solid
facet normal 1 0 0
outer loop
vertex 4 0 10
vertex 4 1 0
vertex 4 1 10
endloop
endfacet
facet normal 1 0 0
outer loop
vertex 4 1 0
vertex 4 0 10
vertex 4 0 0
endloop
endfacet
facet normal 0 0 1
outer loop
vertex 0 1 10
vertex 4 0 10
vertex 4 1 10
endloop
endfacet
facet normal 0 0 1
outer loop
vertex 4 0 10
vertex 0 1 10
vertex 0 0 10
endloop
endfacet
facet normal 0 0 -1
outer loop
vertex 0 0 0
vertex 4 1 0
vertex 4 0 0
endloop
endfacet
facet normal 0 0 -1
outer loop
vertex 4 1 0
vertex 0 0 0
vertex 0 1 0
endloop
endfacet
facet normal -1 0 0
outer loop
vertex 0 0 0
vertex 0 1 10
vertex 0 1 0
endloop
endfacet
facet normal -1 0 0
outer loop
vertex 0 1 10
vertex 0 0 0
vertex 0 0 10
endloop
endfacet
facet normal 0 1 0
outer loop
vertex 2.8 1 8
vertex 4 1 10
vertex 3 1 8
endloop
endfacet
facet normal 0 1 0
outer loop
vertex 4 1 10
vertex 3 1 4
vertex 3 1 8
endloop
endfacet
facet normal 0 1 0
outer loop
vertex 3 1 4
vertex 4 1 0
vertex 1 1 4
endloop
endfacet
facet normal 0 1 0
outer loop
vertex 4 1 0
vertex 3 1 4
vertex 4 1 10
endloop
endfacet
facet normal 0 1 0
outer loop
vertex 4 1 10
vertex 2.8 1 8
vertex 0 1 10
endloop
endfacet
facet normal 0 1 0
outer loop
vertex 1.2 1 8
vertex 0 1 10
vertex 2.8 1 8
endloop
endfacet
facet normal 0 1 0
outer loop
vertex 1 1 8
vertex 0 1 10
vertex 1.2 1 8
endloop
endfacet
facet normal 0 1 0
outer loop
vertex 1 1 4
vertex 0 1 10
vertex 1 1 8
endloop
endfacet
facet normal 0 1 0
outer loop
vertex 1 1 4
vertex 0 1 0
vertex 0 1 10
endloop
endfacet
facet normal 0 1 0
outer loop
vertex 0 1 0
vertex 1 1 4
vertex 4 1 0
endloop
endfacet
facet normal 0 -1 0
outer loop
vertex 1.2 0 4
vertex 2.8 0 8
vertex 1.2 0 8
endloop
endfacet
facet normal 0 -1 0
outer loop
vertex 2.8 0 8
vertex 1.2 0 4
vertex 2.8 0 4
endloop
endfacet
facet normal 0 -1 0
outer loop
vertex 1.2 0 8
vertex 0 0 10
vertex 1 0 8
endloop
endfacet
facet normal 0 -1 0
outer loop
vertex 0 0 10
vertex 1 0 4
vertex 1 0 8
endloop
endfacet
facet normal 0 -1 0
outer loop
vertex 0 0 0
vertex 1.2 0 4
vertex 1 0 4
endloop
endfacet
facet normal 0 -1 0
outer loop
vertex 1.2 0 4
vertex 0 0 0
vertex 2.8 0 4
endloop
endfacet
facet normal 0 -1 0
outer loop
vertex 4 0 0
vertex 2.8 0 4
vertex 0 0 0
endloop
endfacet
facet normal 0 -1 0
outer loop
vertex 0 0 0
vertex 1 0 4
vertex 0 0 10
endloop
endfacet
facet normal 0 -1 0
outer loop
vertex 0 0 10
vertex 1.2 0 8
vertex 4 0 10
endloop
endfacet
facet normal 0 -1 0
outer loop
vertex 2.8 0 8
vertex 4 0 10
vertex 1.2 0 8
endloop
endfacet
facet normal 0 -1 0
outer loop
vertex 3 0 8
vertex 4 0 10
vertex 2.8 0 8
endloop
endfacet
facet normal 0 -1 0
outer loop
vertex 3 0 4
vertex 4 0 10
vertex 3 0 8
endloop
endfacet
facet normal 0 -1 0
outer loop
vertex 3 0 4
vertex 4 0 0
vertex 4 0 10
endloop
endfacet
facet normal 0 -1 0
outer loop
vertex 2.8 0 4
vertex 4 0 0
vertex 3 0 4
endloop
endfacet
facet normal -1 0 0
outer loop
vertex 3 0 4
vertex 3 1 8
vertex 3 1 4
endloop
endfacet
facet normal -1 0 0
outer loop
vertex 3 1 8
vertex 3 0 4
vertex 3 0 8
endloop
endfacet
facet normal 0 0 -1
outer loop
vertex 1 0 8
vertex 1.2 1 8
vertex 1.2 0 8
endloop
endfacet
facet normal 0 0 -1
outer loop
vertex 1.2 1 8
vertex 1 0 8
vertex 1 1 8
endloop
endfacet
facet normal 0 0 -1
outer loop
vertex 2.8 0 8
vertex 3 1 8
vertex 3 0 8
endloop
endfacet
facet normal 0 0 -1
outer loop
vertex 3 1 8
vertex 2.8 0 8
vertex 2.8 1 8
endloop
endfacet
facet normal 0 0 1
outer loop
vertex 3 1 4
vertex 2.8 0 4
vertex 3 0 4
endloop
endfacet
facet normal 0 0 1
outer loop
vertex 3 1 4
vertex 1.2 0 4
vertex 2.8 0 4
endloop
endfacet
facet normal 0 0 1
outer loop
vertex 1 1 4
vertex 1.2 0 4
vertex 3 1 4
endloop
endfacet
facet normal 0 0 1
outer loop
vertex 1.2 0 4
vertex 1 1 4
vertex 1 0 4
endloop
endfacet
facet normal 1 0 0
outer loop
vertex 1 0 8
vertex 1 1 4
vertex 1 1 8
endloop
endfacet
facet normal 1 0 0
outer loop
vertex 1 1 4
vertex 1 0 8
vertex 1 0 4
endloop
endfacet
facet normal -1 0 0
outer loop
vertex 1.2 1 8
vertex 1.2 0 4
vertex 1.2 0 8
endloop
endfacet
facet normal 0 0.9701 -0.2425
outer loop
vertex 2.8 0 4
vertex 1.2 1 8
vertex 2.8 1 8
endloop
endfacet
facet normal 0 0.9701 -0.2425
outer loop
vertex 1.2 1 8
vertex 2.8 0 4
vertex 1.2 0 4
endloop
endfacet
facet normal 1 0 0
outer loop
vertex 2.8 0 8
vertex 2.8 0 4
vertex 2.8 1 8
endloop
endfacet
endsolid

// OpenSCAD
// file: ../math/vect.scad
function vect_scalar_sum(v, incr) = [for (i = [0: len(v) - 1]) v[i] + incr];

function vSize(size) = (!is_list(size)) ? [size, size, size]: size; 


function vect_2d_to_3d(vect, z = 0) = [vect[0], vect[1], z];

function vect_rotate2d(vect, b) = [
    cos(b) * vect[0] - sin(b) * vect[1],
    sin(b) * vect[0] + cos(b) * vect[1]
];

function round_vect(v) = [for (i = [0: len(v) - 1]) round(v[i])];

function vect_swap_xy(v1) = [v1.y, v1.x, v1.z];

function vectorize_2(x) = is_list(x) ? [x.x, x.y] : [x, x];

function vectorize_3(x) = is_list(x) ? [x.x, x.y, x.z] : [x, x, x];

echo (vectorize_3(1));
// file: ../primitives/pyramid.scad
use <../math/align.scad>
use <../math/vect.scad>

module pyramid4(sizes, center){
    align_uncenter(sizes, !center){
        size = [sizes[0] / 2 , sizes[1] / 2, sizes[2]];
        polyhedron(
        points=[ 
            [size[0],size[1],0],
            [size[0],-size[1],0],
            [-size[0],-size[1],0],
            [-size[0],size[1],0], // the four points at base
            [0,0,size[2]]  
        ],                                
        faces=[ 
            [0,1,4],
            [1,2,4],
            [2,3,4],
            [3,0,4],              // each triangle side
            [1,0,3],
            [2,1,3] 
        ]                         // two triangles for square base
        );
    }
}

//
// 
// truncated_pyramid4([20, 20, 30], [5, 5], center = false);
//
module truncated_pyramid4(sizes, top_sizes, center = true){
    align_uncenter(sizes, !center){
        size = [sizes[0] / 2 , sizes[1] / 2, sizes[2]];
        top_size = [top_sizes[0] / 2 , top_sizes[1] / 2];
        h = size[2];
        polyhedron(
        points=[ 
            [size[0], size[1], 0],
            [size[0], -size[1], 0],
            [-size[0], -size[1], 0],
            [-size[0], size[1], 0], // the four points at base

            [top_size[0], top_size[1], h],
            [top_size[0], -top_size[1], h],
            [-top_size[0], -top_size[1], h],
            [-top_size[0], top_size[1], h],
        ],                                 // the apex point 
        faces=[ 
            [3, 2, 1, 0],
            [0, 1, 5, 4],
            [1, 2, 6, 5],
            [2, 3, 7, 6],
            [3, 0, 4, 7],
            [4, 5, 6, 7]
        ]);
    }
}

// truncated_pyramid4([20, 20, 30], [15, 5], center = true);


module pyramid(angles, r, r1, h, center = true){
    function _2d_dot(vect, angle) = vect_rotate2d(vect, angle);
    function _dot(vect, angle, z) = vect_2d_to_3d(_2d_dot(vect, angle), z);
    function _adapt_index(i, num) = 
        i < 0 ? _adapt_index(num + i, num) :
        i < num ? i : _adapt_index(i - num, num);
    function _du(i, num) = _adapt_index(i, num) + num;
    function _db(i, num) = _adapt_index(i, num);

    vect = [r, 0];
    vectU = [r1, 0];
    angle = 360 / angles;
    points = concat(
        [for (i = [0: angles - 1]) _dot(vect, i * angle, 0)],
        [for (i = [0: angles - 1]) _dot(vectU, i * angle, h)]
    );

    faces = concat(
        [[for (i = [0: angles - 1]) _db(i, angles)]],
        [[for (i = [0: angles - 1]) _du(angles - i, angles)]],
        [for (i = [0: angles]) [
            _db(i, angles),
            _du(i, angles), 
            _du(i + 1, angles), 
            _db(i + 1, angles) 
            ]
        ]
    );
    polyhedron(points=points, faces=faces);
}

pyramid(4, 20, 10, 50);
// file: ../math/align.scad
use <vect.scad>
module align_center(sizes, center = true, centerZ = false, vector=[1, 1, 0]){
    xxx=vector.x;
    yyy=vector.y;
    zzz=centerZ || vector.z;
    sizes = vSize(sizes);
    if (center){
        translate([xxx ? -sizes[0] / 2 : 0, yyy ? -sizes[1] / 2: 0, zzz ? -sizes[2]/2 : 0]){
            children();
        }
    } else {
        children();
    }   
}

module align_uncenter(sizes, uncenter = true, uncenterZ = false){
    sizes = vSize(sizes);
    if (uncenter){
        translate([sizes[0] / 2, sizes[1] / 2, (uncenterZ ? sizes[2]/2 : 0)]){
            children();
        }
    } else {
        children();
    }   
}

ALIGN_LEFT=[1, 0, 0];
ALIGN_RIGHT=[-1, 0, 0];
ALIGN_BOTTOM=[0, 0, -1];
ALIGN_TOP=[0, 0, 1];
ALIGN_BACK=[0, -1, 0];
ALIGN_FWD=[0, 1, 0];

function _aligner(target, source, align) = 
            align > 0 ? target * align:
            align < 0 ? source * align:
            (target - source) / 2;    

function aligner(target_sizes, source_sizes, vector) = [
    vector.x == undef ? 0 : _aligner(target_sizes.x, source_sizes.x, vector.x),
    vector.y == undef ? 0 : _aligner(target_sizes.y, source_sizes.y, vector.y),
    vector.z == undef ? 0 : _aligner(target_sizes.z, source_sizes.z, vector.z)
];

module align_relative(
    target_sizes, 
    source_sizes, 
    vector=[0,0,undef]
    ){
        
    // x = vector.x == undef ? 0 : _aligner(target_sizes.y, source_sizes.x, vector.x);
    // y = vector.y == undef ? 0 : _aligner(target_sizes.y, source_sizes.y, vector.y);
    // z = vector.z == undef ? 0 : _aligner(target_sizes.z, source_sizes.z, vector.z);
    to_translate = aligner(target_sizes, source_sizes, vector);
    echo(to_translate);
    translate(to_translate)
        children();
}

module align_center_source_vs_target(target_sizes, source_sizes, centerZ = false){
    align_relative(target_sizes=target_sizes, source_sizes=source_sizes, vector=[0, 0, centerZ ? 1 : 0])
        children();
}


module zz(z){
    translate([0, 0, z])
        children();
}

module xx(x){
    translate([x, 0, 0])
        children();
}

module yy(y){
    translate([0, y, 0])
        children();
}

module rz(z){
    rotate([0, 0, z])
        children();
}

module rx(x){
    rotate([x, 0, 0])
        children();
}

module ry(y){
    rotate([0, y, 0])
        children();
}

module zc(){
    translate([0, 0, -0.01])
        children();
}
module xc(){
    translate([-0.01, 0, 0])    
        children();
}
module yc(){
    translate([0, -0.01, 0])
        children();
}

// align_center_source_vs_target([100, 100, 1], [10, 10, 10], centerZ = false){
//     cube([100,100,1]);
//     cube([10,10,10]);
// }

// align_center(20){
//     align_uncenter(20){
//         cube(20);
//     }
// }

// target_sizes = [20, 20, 20];
// source_sizes = [10, 10, 10];
// color("azure",0.25)
//     cube(size=target_sizes);
// align_relative(target_sizes=target_sizes, source_sizes=source_sizes, vector=[0, 0, undef]){
//     color("red",0.25)
//         zz(20)
//         cube(size=source_sizes);
// }
// main file
use <../math/align.scad>
use <../primitives/pyramid.scad>

module simple_latch_mask(sizes) {
  cube(sizes);
}

module simple_latch_mother(sizes, hole_sizes, hole_offset = 2){
    difference(){
        cube(sizes);
        yc() xx(sizes.x / 2 - hole_sizes.x / 2) zz(sizes.z - hole_sizes.y - hole_offset) cube([hole_sizes.x, sizes.y + 1, hole_sizes.y]);
    }
}

module simple_latch_father(sizes, hole_sizes, hole_offset = 2, compensation = 0.2){
    zz(sizes.z - hole_sizes.y - hole_offset)
    xx(sizes.x / 2 - hole_sizes.x / 2 + compensation)
    mirror([0, 0, 1])
    rotate([0, 90, 0])
    linear_extrude(hole_sizes.x - compensation * 2) 
    polygon(points=[
        [0, 0], 
        [hole_sizes.y, sizes.y], 
        [hole_sizes.y, 0]
    ], 
    paths=[[0,1,2]]);
}


#simple_latch_mother([4, 1, 10], [2, 4]);
simple_latch_father([4, 1, 10], [2, 4]);
